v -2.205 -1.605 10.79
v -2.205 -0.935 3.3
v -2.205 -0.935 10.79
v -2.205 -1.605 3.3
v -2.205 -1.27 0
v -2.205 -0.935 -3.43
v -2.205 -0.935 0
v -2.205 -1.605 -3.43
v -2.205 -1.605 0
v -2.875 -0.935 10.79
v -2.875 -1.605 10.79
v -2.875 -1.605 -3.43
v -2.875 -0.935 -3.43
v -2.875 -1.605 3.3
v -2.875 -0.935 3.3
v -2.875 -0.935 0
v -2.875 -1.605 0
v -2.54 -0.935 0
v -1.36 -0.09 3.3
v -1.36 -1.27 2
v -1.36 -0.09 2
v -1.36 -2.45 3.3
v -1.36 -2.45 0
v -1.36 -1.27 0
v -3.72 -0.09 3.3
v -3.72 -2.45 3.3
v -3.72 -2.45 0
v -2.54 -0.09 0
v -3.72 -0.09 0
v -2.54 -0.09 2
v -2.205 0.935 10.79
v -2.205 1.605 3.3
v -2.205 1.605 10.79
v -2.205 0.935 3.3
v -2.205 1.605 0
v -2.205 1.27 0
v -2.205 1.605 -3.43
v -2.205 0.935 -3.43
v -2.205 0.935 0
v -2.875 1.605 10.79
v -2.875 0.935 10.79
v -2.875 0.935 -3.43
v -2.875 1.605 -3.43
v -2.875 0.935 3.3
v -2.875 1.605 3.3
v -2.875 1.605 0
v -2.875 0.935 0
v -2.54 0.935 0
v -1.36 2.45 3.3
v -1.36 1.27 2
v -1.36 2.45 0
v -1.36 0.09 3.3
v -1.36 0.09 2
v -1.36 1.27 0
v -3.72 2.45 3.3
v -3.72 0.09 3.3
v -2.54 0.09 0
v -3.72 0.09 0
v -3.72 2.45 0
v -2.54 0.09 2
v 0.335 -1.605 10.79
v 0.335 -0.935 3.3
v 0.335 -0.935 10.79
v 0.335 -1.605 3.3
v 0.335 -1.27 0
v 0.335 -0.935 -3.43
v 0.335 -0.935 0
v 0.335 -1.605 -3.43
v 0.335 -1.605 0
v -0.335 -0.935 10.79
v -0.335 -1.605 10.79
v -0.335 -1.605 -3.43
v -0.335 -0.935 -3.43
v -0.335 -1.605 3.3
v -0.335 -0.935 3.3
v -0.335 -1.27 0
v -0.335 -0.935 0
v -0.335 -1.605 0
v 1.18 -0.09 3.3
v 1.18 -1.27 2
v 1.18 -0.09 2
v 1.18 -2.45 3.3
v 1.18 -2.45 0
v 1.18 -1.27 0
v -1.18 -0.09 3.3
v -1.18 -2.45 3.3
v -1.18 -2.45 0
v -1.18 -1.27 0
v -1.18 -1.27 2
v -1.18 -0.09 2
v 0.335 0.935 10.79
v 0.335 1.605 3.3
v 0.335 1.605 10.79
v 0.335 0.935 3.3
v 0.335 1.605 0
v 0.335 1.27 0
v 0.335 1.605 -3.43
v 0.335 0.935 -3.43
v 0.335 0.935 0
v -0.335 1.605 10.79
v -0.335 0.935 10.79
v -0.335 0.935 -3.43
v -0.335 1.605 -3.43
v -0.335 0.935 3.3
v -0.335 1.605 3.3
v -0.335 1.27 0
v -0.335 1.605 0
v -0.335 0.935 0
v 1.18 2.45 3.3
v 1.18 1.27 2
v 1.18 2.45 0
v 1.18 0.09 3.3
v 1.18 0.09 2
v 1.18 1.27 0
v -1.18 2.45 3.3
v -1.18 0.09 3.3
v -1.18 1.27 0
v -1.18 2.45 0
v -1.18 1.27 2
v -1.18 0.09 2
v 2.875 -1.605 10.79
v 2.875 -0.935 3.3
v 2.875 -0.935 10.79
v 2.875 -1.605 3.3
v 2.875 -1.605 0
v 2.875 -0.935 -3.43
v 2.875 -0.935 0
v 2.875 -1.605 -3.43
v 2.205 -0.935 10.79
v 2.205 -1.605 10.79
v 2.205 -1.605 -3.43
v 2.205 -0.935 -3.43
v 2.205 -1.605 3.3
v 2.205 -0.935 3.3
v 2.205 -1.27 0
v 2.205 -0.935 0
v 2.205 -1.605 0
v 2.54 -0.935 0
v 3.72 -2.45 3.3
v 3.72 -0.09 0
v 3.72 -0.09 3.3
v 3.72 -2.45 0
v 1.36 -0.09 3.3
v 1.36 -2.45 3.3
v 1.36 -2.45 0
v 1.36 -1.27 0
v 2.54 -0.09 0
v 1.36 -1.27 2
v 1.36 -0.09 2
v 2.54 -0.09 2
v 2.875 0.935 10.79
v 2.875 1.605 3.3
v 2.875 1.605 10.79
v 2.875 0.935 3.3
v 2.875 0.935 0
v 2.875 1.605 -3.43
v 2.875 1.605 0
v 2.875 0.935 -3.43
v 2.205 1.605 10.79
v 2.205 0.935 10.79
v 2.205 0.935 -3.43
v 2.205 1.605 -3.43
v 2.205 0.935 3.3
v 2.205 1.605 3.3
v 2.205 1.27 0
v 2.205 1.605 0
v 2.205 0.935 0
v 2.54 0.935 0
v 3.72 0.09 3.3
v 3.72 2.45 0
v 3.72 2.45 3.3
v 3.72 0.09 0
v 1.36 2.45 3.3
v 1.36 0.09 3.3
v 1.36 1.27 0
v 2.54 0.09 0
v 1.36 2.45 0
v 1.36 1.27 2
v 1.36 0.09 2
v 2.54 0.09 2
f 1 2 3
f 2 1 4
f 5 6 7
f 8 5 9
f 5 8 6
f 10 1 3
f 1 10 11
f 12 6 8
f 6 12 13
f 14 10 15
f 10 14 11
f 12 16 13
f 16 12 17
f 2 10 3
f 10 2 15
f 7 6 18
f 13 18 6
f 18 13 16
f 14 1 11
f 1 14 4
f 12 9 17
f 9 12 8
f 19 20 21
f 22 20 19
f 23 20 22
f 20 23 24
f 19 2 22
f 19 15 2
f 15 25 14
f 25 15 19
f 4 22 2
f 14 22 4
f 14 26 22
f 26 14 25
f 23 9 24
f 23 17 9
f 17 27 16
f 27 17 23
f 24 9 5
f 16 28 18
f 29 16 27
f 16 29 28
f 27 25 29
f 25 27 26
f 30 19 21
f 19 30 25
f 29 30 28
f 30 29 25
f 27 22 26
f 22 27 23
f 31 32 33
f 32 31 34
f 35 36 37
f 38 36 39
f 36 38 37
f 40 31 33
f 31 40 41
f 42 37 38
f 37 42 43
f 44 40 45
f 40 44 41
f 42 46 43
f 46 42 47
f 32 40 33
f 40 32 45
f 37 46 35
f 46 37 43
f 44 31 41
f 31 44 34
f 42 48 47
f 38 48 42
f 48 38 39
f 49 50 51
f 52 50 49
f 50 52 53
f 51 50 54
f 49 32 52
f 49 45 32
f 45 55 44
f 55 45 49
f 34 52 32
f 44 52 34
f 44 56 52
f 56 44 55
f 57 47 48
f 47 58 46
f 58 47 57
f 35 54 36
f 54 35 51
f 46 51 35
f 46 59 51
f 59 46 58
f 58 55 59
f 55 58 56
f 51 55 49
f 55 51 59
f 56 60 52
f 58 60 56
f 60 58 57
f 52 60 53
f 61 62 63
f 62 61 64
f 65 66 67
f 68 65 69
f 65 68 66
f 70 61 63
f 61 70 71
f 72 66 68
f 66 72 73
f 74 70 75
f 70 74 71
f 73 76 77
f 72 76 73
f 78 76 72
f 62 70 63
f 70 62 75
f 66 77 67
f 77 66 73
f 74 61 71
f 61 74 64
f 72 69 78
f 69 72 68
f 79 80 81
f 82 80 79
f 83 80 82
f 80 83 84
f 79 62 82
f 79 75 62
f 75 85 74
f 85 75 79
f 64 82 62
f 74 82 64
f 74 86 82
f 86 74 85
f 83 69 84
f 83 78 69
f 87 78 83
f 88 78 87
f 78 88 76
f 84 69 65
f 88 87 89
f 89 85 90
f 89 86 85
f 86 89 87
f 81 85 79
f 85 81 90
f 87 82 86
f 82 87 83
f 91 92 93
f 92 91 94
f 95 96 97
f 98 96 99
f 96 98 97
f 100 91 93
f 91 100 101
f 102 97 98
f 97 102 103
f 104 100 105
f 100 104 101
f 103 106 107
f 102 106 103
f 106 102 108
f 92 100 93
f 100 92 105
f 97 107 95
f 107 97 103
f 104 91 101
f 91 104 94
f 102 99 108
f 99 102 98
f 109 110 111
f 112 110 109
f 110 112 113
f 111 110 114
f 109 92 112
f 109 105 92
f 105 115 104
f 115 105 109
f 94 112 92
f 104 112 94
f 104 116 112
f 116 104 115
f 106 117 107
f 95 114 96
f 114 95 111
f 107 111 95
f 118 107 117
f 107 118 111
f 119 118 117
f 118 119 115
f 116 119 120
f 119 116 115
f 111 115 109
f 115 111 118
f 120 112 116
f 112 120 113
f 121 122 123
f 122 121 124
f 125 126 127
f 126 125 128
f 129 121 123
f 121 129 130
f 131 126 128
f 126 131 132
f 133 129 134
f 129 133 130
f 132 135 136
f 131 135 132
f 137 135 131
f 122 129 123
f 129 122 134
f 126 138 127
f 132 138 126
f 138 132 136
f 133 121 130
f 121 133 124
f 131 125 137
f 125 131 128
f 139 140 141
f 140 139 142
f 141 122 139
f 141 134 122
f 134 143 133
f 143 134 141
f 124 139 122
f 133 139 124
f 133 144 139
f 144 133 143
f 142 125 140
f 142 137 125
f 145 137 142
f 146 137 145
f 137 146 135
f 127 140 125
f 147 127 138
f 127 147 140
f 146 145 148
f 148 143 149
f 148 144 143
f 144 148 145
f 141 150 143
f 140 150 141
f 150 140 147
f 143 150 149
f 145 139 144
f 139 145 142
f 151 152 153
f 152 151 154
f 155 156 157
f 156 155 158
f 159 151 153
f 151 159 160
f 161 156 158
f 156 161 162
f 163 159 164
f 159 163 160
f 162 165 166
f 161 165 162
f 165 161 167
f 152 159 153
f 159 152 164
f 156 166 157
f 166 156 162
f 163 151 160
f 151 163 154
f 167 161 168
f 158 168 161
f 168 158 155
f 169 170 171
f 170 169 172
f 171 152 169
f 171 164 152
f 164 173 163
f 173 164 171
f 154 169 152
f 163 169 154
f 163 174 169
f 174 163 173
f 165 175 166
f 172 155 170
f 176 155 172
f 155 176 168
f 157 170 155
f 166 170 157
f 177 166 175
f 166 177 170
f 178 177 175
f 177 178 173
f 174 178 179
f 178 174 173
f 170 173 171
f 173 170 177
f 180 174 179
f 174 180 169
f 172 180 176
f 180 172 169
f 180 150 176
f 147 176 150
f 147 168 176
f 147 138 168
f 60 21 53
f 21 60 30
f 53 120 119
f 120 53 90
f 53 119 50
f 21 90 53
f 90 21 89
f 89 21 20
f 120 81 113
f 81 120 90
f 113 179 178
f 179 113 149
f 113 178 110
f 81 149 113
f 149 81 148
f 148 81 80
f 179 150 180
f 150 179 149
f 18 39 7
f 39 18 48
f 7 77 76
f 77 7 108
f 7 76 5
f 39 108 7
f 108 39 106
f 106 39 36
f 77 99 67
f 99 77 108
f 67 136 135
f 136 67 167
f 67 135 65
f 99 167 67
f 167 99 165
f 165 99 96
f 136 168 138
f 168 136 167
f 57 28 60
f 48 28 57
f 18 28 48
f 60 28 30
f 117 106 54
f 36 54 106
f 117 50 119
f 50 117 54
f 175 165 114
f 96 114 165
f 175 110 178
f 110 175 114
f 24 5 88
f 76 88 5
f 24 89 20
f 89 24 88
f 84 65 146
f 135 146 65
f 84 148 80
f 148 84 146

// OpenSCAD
/*
  Breakaway Header Pins: pitch 2.54, adjustable
  Aaron Ciuffo
  December 23 2015
  GPL V3

  derived from Molex KK 100 break-away header:
  http://www.molex.com/pdm_docs/sd/022032041_sd.pdf

  Usage (default values shown): 
  ```
  use </path/to/libraries/header_pins.scad>
  //full
  headerPins(columns = 3, rows = 2, centerV = false, center = true, pitch = 2.52);
  //simple
  headerPins(3, 2);
  ```
  columns = integer number of columns (X axis)
  rows = integer number of rows (Y axis)
  centerV = vertically center around base - fale places bottom at origin
  center = center the array at the origin
  pitch = distance between center of each pin

  Note: 
  * the breakaway connector is a bit of a fudge and does not appear at the same
    Z height for centered/versus non centered; this should be largely irrelevant 

  updates can be found at GitHub:
  https://github.com/txoof/OpenSCAD_electronics

*/

/*[Dimensions]*/
//Columns
columns = 3; //[1:30]
//Rows
rows = 2; //[1:5]
//Pitch
pitch = 2.54; //[1.25, 1.27, 2, 2.54, 3.5, 3.96]

module singlePin(center = false) {
  pinDimensions = [.67, .67, 14.22];
  nylonDimensions = [2.36, 2.36, 3.3];
  pinAboveNylon = 7.49;

  trans = center == false ? [0, 0, nylonDimensions[2]/2] : [0, 0, 0];

  translate(trans)
  union() {
    translate([0, 0, (-pinDimensions[2]/2+nylonDimensions[2]/2)+pinAboveNylon])
      color("gold")
      cube(pinDimensions, center = true);    
    color("darkgray")
      cube(nylonDimensions, center =true);
  }
}

module headerPins(columns = 3, rows = 2, centerV = false, center = true, pitch = 2.54) {
  transV = centerV == false ? pitch/2 : 0; // vertical center

  trans = center == false ? [0, 0, 0] : [-(columns-1)*pitch/2, -(rows-1)*pitch/2, 0];

  echo (trans);
  translate(trans) 
  union() {
    for (i = [0:columns-1]) {
      for (j = [0:rows-1]) {
        translate([pitch*i, pitch*j, 0])
          singlePin();
      }
    }
    translate([0, 0, -pitch/2+transV])
      color("black")
      cube([pitch*(columns-1), pitch*(rows-1), 2]);
  }
}

//singlePin();
headerPins(columns = columns , rows = rows, pitch = pitch);
